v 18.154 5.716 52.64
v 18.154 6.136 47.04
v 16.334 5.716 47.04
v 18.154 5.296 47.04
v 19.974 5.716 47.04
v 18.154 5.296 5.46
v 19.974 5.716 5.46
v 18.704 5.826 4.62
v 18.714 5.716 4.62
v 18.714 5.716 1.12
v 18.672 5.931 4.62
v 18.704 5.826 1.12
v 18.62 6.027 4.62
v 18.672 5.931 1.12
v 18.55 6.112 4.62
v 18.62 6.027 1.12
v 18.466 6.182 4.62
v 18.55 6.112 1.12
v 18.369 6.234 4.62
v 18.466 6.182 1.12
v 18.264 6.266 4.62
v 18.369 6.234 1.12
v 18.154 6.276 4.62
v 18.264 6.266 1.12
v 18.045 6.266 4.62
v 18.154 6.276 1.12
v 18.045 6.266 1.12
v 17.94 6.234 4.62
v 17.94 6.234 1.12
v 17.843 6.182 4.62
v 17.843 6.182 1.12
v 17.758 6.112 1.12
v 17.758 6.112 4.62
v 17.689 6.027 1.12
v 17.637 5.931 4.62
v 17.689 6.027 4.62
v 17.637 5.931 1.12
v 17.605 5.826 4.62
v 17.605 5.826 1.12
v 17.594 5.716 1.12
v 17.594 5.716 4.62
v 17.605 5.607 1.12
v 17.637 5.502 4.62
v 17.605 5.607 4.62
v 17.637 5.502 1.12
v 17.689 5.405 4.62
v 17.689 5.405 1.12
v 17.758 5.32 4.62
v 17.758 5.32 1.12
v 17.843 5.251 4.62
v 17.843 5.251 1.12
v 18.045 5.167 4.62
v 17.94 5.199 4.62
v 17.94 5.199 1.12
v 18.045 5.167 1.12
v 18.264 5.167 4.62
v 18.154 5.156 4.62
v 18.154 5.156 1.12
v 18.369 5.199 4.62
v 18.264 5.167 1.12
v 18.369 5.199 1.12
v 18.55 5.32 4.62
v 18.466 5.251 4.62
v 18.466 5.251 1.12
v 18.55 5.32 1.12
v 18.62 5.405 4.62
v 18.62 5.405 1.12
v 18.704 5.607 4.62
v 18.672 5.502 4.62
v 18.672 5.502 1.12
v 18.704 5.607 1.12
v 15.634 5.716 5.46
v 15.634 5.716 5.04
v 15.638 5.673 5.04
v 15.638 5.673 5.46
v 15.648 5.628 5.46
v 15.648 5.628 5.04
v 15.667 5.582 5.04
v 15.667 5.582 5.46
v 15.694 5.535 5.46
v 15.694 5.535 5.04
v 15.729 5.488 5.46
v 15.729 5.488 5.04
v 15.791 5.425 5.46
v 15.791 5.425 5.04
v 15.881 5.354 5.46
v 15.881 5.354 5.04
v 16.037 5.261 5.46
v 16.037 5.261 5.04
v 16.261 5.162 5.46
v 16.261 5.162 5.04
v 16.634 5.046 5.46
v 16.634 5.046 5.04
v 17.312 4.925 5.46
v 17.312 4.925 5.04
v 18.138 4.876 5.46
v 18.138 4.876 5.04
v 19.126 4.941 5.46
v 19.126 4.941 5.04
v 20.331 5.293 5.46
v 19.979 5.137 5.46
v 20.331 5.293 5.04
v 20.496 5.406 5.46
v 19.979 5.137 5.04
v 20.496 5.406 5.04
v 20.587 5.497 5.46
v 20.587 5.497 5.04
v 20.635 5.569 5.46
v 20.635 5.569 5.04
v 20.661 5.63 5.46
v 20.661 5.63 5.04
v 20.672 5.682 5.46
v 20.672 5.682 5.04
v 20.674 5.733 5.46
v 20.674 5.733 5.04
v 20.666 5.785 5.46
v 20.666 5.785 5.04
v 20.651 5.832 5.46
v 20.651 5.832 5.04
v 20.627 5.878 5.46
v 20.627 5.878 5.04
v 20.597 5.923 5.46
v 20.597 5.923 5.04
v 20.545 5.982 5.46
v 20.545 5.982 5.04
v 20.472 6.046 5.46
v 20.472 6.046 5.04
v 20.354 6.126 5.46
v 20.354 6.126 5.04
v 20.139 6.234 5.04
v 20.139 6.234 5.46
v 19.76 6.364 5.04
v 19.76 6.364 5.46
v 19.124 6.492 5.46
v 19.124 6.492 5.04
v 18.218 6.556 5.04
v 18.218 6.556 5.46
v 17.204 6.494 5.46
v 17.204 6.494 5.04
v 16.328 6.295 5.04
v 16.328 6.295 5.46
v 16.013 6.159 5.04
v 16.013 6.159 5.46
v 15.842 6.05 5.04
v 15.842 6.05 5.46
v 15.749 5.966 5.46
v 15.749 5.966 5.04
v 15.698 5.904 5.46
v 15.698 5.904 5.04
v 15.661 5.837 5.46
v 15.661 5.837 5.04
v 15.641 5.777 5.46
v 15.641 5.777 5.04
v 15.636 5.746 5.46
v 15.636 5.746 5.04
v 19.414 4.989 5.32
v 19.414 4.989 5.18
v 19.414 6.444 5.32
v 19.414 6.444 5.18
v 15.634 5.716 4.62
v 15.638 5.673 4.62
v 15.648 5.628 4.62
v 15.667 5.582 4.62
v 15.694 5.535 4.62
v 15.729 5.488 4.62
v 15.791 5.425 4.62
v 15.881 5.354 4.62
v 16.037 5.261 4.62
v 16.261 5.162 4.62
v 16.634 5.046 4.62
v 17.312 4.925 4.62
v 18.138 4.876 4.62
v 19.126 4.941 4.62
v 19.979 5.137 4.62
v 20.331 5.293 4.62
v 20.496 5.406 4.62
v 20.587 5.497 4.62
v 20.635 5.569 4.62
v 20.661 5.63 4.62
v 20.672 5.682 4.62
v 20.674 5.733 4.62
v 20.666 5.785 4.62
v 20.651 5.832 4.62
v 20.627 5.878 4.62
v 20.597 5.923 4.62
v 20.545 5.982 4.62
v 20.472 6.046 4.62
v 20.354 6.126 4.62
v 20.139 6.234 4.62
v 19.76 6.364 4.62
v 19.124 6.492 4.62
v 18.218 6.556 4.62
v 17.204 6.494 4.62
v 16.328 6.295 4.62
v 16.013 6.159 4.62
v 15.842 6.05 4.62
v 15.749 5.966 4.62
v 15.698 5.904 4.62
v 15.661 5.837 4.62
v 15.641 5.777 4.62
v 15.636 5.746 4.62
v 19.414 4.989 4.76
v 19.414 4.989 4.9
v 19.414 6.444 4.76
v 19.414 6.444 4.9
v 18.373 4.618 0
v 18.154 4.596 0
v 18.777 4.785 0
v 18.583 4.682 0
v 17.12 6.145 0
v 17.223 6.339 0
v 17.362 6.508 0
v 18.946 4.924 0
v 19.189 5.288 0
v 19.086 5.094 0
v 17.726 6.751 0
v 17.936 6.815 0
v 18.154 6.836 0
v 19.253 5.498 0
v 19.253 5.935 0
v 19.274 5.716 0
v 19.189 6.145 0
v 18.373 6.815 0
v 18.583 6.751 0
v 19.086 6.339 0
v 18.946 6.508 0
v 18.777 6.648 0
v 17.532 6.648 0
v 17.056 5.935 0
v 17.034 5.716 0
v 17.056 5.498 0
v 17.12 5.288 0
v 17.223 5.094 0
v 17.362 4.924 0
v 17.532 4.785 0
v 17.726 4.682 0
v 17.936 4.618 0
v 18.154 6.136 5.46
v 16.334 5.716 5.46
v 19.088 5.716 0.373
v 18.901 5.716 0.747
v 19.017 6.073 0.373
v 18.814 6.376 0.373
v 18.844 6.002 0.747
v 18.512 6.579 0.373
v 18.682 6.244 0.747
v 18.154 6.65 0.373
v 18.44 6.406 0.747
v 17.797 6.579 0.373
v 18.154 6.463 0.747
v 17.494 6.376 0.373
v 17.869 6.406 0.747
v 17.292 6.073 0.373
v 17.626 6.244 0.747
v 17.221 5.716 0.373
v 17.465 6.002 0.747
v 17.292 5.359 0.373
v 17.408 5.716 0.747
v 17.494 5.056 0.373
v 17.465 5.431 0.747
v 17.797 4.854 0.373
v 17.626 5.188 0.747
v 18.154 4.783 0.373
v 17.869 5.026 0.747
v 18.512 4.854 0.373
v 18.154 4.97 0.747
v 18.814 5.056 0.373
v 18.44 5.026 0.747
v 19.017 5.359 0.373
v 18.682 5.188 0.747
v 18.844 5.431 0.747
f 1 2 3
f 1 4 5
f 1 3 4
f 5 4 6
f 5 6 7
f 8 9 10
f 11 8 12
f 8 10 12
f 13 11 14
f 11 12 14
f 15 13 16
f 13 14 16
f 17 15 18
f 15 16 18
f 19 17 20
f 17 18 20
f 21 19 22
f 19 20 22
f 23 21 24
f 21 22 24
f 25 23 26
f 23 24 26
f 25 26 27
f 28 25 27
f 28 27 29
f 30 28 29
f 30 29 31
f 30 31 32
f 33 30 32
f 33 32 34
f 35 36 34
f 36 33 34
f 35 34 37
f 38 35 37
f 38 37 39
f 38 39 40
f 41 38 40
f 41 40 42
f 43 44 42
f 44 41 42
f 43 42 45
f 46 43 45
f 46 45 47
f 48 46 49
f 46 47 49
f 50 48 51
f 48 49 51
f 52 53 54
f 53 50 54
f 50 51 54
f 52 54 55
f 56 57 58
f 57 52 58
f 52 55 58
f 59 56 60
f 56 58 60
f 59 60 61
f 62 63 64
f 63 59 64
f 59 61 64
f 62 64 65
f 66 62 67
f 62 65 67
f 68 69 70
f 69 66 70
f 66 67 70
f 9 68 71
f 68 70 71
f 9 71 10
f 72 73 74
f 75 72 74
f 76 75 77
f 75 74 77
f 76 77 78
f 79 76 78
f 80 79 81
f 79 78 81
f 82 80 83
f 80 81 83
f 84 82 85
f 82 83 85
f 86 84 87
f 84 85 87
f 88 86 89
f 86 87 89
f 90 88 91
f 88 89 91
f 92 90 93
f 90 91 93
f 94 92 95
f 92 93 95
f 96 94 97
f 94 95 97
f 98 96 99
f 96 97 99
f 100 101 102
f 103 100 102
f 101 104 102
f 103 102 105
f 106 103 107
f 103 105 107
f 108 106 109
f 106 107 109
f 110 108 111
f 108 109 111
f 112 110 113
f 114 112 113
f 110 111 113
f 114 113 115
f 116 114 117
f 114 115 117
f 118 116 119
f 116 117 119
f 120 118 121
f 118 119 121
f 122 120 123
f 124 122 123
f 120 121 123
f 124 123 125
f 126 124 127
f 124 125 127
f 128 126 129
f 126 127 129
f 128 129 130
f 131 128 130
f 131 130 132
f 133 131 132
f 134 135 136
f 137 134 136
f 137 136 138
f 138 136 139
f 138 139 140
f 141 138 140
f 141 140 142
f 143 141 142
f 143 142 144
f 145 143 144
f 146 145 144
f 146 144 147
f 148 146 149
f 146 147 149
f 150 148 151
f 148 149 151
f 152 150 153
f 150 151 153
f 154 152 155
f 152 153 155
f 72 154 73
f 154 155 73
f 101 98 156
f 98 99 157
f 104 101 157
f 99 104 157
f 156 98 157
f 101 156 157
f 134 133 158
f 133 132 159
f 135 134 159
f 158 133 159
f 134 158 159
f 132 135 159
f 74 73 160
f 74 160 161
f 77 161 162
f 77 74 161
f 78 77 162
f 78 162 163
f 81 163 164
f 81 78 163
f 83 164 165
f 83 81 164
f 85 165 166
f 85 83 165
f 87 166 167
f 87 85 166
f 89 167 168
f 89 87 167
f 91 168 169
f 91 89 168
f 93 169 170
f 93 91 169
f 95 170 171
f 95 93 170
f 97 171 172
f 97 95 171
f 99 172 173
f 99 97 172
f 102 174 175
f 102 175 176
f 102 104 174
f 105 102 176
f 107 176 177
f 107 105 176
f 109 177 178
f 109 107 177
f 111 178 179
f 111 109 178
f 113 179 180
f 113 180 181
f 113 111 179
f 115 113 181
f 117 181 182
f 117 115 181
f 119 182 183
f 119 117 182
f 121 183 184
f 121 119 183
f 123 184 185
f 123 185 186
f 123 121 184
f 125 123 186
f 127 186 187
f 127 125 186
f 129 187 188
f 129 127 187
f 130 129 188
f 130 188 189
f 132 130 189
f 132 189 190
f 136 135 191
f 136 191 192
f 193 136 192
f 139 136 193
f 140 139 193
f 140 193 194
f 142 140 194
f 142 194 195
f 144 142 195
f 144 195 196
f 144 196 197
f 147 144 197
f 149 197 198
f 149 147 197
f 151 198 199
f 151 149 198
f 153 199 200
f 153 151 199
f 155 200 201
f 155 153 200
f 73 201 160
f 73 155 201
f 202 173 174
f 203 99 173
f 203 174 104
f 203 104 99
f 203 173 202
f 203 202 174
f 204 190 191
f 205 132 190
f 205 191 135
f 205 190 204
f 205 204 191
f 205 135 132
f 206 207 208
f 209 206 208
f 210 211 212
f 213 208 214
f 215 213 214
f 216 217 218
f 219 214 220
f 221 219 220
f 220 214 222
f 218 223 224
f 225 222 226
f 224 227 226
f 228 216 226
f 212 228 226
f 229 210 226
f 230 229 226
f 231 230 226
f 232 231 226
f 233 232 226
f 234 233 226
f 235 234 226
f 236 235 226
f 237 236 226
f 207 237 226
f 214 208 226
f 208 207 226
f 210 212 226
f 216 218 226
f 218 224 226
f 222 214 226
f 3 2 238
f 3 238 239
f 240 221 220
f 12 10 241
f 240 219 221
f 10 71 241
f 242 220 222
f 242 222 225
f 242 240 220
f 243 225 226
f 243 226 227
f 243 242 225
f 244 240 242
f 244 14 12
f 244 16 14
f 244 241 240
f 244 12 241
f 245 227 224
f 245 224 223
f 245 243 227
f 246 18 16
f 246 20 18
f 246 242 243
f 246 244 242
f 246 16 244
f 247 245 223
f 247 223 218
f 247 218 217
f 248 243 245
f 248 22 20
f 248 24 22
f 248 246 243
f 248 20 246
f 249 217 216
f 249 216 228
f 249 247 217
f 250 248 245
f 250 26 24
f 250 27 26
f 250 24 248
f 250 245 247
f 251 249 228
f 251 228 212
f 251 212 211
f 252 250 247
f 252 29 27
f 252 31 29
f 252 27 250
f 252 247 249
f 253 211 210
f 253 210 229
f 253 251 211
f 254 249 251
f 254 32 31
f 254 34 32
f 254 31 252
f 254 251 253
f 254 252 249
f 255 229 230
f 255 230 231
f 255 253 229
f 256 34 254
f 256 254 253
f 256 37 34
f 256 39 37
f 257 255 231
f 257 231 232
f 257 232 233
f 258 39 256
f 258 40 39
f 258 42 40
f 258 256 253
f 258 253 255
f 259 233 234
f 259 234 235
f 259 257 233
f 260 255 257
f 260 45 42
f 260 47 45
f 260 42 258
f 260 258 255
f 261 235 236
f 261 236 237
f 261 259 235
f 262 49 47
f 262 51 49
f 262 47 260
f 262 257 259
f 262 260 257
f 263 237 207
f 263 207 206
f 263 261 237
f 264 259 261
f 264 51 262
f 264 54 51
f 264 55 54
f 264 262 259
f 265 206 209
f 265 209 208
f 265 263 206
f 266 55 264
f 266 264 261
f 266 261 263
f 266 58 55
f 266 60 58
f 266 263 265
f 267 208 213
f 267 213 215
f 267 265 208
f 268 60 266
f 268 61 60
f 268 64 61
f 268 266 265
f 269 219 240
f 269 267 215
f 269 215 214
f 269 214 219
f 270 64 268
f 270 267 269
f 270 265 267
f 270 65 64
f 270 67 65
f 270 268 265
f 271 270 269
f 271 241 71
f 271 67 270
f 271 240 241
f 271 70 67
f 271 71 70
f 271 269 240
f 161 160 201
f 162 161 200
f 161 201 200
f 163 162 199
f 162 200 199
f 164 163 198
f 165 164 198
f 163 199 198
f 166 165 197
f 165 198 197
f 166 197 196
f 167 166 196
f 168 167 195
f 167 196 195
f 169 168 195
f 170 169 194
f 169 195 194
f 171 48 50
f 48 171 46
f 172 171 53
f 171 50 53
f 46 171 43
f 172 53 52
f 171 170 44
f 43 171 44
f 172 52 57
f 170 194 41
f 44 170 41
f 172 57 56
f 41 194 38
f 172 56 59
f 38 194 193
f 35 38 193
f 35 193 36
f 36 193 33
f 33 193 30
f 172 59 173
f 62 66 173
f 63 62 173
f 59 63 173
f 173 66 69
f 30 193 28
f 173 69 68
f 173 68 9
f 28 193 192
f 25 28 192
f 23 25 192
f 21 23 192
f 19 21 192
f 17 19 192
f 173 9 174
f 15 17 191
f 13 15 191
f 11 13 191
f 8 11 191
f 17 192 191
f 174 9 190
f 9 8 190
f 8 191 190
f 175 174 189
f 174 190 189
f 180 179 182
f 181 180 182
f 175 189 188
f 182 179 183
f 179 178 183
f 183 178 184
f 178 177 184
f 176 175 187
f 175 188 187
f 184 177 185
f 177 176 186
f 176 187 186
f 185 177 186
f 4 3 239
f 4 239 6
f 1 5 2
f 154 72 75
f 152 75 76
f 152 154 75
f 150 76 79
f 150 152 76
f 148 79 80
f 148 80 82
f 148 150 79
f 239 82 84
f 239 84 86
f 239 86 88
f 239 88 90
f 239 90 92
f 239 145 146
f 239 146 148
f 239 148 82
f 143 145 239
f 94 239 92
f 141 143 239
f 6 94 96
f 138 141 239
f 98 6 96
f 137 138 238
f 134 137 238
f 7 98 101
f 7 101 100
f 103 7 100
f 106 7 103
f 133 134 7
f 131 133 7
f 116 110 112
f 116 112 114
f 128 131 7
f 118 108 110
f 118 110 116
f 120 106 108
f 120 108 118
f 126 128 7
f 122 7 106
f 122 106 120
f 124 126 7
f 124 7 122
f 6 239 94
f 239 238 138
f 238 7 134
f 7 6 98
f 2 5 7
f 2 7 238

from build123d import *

# Parameters (mm, degrees)
F0_R      = 0.8
F2_R      = 0.4
F6_DEPTH  = 2.6
F7_DEPTH  = 0.3
F10_DEPTH = 30
F14_SCALE = 1.4


with BuildPart() as f5:
    # F0 (on Top) → F5 section 0
    with BuildSketch(Plane.XY):
        with Locations((12.9674375057, 4.0830690414)):
            Circle(F0_R)
    # F2 (on offset) → F5 section 1
    with BuildSketch(Plane.XY.offset(0.8)):
        with Locations((12.9674375057, 4.0830690414)):
            Circle(F2_R)
    loft()

    # F6 (add): a face of the model
    f6_faces = [f5.faces().sort_by_distance(p)[0] for p in [
        (12.9674375057, 4.0830690414, 0.8),
    ]]
    extrude(f6_faces, amount=F6_DEPTH)

    # F4 (on offset) → F7 (join, symmetric)
    with BuildSketch(Plane.XY.offset(3.6)):
        with BuildLine():
            add(Edge.make_bspline(
                [(11.1674375057, 4.0830690414), (11.1674375057, 3.0438385568), (13.8674375057, 3.5634537991), (16.5674375057, 4.0830690414), (13.8674375057, 4.6026842836), (11.1674375057, 5.1222995259), (11.1674375057, 4.0830690414)],
                knots=[0, 0, 0, 2.0943951024, 2.0943951024, 4.1887902048, 4.1887902048, 6.2831853072, 6.2831853072, 6.2831853072], degree=2, weights=[1, 0.5, 1, 0.5, 1, 0.5, 1]))
        make_face()
    extrude(amount=F7_DEPTH, both=True)

    # F9 (on offset) → F10 (join)
    with BuildSketch(Plane.XY.offset(3.6)):
        Polygon((12.9674375057, 4.3830690414), (11.6674375057, 4.0830690414), (12.9674375057, 3.7830690414), (14.2674375057, 4.0830690414), align=None)
    extrude(amount=F10_DEPTH)

    # F10_face (on face) → F13 section 0
    with BuildSketch(Plane(origin=(12.9674375057, 4.0830690414, 33.6), x_dir=(1, 0, 0), z_dir=(0, 0, 1)), mode=Mode.PRIVATE) as f13_s0:
        Polygon((0, 0.3), (-1.3, 0), (0, -0.3), (1.3, 0), align=None)
    loft([f13_s0.sketch, Vertex(12.9674375057, 4.0830690414, 37.6)])


with BuildPart() as f5_1:
    # F14: moved
    add(f5.part.scale(F14_SCALE))


solid = f5_1.part
